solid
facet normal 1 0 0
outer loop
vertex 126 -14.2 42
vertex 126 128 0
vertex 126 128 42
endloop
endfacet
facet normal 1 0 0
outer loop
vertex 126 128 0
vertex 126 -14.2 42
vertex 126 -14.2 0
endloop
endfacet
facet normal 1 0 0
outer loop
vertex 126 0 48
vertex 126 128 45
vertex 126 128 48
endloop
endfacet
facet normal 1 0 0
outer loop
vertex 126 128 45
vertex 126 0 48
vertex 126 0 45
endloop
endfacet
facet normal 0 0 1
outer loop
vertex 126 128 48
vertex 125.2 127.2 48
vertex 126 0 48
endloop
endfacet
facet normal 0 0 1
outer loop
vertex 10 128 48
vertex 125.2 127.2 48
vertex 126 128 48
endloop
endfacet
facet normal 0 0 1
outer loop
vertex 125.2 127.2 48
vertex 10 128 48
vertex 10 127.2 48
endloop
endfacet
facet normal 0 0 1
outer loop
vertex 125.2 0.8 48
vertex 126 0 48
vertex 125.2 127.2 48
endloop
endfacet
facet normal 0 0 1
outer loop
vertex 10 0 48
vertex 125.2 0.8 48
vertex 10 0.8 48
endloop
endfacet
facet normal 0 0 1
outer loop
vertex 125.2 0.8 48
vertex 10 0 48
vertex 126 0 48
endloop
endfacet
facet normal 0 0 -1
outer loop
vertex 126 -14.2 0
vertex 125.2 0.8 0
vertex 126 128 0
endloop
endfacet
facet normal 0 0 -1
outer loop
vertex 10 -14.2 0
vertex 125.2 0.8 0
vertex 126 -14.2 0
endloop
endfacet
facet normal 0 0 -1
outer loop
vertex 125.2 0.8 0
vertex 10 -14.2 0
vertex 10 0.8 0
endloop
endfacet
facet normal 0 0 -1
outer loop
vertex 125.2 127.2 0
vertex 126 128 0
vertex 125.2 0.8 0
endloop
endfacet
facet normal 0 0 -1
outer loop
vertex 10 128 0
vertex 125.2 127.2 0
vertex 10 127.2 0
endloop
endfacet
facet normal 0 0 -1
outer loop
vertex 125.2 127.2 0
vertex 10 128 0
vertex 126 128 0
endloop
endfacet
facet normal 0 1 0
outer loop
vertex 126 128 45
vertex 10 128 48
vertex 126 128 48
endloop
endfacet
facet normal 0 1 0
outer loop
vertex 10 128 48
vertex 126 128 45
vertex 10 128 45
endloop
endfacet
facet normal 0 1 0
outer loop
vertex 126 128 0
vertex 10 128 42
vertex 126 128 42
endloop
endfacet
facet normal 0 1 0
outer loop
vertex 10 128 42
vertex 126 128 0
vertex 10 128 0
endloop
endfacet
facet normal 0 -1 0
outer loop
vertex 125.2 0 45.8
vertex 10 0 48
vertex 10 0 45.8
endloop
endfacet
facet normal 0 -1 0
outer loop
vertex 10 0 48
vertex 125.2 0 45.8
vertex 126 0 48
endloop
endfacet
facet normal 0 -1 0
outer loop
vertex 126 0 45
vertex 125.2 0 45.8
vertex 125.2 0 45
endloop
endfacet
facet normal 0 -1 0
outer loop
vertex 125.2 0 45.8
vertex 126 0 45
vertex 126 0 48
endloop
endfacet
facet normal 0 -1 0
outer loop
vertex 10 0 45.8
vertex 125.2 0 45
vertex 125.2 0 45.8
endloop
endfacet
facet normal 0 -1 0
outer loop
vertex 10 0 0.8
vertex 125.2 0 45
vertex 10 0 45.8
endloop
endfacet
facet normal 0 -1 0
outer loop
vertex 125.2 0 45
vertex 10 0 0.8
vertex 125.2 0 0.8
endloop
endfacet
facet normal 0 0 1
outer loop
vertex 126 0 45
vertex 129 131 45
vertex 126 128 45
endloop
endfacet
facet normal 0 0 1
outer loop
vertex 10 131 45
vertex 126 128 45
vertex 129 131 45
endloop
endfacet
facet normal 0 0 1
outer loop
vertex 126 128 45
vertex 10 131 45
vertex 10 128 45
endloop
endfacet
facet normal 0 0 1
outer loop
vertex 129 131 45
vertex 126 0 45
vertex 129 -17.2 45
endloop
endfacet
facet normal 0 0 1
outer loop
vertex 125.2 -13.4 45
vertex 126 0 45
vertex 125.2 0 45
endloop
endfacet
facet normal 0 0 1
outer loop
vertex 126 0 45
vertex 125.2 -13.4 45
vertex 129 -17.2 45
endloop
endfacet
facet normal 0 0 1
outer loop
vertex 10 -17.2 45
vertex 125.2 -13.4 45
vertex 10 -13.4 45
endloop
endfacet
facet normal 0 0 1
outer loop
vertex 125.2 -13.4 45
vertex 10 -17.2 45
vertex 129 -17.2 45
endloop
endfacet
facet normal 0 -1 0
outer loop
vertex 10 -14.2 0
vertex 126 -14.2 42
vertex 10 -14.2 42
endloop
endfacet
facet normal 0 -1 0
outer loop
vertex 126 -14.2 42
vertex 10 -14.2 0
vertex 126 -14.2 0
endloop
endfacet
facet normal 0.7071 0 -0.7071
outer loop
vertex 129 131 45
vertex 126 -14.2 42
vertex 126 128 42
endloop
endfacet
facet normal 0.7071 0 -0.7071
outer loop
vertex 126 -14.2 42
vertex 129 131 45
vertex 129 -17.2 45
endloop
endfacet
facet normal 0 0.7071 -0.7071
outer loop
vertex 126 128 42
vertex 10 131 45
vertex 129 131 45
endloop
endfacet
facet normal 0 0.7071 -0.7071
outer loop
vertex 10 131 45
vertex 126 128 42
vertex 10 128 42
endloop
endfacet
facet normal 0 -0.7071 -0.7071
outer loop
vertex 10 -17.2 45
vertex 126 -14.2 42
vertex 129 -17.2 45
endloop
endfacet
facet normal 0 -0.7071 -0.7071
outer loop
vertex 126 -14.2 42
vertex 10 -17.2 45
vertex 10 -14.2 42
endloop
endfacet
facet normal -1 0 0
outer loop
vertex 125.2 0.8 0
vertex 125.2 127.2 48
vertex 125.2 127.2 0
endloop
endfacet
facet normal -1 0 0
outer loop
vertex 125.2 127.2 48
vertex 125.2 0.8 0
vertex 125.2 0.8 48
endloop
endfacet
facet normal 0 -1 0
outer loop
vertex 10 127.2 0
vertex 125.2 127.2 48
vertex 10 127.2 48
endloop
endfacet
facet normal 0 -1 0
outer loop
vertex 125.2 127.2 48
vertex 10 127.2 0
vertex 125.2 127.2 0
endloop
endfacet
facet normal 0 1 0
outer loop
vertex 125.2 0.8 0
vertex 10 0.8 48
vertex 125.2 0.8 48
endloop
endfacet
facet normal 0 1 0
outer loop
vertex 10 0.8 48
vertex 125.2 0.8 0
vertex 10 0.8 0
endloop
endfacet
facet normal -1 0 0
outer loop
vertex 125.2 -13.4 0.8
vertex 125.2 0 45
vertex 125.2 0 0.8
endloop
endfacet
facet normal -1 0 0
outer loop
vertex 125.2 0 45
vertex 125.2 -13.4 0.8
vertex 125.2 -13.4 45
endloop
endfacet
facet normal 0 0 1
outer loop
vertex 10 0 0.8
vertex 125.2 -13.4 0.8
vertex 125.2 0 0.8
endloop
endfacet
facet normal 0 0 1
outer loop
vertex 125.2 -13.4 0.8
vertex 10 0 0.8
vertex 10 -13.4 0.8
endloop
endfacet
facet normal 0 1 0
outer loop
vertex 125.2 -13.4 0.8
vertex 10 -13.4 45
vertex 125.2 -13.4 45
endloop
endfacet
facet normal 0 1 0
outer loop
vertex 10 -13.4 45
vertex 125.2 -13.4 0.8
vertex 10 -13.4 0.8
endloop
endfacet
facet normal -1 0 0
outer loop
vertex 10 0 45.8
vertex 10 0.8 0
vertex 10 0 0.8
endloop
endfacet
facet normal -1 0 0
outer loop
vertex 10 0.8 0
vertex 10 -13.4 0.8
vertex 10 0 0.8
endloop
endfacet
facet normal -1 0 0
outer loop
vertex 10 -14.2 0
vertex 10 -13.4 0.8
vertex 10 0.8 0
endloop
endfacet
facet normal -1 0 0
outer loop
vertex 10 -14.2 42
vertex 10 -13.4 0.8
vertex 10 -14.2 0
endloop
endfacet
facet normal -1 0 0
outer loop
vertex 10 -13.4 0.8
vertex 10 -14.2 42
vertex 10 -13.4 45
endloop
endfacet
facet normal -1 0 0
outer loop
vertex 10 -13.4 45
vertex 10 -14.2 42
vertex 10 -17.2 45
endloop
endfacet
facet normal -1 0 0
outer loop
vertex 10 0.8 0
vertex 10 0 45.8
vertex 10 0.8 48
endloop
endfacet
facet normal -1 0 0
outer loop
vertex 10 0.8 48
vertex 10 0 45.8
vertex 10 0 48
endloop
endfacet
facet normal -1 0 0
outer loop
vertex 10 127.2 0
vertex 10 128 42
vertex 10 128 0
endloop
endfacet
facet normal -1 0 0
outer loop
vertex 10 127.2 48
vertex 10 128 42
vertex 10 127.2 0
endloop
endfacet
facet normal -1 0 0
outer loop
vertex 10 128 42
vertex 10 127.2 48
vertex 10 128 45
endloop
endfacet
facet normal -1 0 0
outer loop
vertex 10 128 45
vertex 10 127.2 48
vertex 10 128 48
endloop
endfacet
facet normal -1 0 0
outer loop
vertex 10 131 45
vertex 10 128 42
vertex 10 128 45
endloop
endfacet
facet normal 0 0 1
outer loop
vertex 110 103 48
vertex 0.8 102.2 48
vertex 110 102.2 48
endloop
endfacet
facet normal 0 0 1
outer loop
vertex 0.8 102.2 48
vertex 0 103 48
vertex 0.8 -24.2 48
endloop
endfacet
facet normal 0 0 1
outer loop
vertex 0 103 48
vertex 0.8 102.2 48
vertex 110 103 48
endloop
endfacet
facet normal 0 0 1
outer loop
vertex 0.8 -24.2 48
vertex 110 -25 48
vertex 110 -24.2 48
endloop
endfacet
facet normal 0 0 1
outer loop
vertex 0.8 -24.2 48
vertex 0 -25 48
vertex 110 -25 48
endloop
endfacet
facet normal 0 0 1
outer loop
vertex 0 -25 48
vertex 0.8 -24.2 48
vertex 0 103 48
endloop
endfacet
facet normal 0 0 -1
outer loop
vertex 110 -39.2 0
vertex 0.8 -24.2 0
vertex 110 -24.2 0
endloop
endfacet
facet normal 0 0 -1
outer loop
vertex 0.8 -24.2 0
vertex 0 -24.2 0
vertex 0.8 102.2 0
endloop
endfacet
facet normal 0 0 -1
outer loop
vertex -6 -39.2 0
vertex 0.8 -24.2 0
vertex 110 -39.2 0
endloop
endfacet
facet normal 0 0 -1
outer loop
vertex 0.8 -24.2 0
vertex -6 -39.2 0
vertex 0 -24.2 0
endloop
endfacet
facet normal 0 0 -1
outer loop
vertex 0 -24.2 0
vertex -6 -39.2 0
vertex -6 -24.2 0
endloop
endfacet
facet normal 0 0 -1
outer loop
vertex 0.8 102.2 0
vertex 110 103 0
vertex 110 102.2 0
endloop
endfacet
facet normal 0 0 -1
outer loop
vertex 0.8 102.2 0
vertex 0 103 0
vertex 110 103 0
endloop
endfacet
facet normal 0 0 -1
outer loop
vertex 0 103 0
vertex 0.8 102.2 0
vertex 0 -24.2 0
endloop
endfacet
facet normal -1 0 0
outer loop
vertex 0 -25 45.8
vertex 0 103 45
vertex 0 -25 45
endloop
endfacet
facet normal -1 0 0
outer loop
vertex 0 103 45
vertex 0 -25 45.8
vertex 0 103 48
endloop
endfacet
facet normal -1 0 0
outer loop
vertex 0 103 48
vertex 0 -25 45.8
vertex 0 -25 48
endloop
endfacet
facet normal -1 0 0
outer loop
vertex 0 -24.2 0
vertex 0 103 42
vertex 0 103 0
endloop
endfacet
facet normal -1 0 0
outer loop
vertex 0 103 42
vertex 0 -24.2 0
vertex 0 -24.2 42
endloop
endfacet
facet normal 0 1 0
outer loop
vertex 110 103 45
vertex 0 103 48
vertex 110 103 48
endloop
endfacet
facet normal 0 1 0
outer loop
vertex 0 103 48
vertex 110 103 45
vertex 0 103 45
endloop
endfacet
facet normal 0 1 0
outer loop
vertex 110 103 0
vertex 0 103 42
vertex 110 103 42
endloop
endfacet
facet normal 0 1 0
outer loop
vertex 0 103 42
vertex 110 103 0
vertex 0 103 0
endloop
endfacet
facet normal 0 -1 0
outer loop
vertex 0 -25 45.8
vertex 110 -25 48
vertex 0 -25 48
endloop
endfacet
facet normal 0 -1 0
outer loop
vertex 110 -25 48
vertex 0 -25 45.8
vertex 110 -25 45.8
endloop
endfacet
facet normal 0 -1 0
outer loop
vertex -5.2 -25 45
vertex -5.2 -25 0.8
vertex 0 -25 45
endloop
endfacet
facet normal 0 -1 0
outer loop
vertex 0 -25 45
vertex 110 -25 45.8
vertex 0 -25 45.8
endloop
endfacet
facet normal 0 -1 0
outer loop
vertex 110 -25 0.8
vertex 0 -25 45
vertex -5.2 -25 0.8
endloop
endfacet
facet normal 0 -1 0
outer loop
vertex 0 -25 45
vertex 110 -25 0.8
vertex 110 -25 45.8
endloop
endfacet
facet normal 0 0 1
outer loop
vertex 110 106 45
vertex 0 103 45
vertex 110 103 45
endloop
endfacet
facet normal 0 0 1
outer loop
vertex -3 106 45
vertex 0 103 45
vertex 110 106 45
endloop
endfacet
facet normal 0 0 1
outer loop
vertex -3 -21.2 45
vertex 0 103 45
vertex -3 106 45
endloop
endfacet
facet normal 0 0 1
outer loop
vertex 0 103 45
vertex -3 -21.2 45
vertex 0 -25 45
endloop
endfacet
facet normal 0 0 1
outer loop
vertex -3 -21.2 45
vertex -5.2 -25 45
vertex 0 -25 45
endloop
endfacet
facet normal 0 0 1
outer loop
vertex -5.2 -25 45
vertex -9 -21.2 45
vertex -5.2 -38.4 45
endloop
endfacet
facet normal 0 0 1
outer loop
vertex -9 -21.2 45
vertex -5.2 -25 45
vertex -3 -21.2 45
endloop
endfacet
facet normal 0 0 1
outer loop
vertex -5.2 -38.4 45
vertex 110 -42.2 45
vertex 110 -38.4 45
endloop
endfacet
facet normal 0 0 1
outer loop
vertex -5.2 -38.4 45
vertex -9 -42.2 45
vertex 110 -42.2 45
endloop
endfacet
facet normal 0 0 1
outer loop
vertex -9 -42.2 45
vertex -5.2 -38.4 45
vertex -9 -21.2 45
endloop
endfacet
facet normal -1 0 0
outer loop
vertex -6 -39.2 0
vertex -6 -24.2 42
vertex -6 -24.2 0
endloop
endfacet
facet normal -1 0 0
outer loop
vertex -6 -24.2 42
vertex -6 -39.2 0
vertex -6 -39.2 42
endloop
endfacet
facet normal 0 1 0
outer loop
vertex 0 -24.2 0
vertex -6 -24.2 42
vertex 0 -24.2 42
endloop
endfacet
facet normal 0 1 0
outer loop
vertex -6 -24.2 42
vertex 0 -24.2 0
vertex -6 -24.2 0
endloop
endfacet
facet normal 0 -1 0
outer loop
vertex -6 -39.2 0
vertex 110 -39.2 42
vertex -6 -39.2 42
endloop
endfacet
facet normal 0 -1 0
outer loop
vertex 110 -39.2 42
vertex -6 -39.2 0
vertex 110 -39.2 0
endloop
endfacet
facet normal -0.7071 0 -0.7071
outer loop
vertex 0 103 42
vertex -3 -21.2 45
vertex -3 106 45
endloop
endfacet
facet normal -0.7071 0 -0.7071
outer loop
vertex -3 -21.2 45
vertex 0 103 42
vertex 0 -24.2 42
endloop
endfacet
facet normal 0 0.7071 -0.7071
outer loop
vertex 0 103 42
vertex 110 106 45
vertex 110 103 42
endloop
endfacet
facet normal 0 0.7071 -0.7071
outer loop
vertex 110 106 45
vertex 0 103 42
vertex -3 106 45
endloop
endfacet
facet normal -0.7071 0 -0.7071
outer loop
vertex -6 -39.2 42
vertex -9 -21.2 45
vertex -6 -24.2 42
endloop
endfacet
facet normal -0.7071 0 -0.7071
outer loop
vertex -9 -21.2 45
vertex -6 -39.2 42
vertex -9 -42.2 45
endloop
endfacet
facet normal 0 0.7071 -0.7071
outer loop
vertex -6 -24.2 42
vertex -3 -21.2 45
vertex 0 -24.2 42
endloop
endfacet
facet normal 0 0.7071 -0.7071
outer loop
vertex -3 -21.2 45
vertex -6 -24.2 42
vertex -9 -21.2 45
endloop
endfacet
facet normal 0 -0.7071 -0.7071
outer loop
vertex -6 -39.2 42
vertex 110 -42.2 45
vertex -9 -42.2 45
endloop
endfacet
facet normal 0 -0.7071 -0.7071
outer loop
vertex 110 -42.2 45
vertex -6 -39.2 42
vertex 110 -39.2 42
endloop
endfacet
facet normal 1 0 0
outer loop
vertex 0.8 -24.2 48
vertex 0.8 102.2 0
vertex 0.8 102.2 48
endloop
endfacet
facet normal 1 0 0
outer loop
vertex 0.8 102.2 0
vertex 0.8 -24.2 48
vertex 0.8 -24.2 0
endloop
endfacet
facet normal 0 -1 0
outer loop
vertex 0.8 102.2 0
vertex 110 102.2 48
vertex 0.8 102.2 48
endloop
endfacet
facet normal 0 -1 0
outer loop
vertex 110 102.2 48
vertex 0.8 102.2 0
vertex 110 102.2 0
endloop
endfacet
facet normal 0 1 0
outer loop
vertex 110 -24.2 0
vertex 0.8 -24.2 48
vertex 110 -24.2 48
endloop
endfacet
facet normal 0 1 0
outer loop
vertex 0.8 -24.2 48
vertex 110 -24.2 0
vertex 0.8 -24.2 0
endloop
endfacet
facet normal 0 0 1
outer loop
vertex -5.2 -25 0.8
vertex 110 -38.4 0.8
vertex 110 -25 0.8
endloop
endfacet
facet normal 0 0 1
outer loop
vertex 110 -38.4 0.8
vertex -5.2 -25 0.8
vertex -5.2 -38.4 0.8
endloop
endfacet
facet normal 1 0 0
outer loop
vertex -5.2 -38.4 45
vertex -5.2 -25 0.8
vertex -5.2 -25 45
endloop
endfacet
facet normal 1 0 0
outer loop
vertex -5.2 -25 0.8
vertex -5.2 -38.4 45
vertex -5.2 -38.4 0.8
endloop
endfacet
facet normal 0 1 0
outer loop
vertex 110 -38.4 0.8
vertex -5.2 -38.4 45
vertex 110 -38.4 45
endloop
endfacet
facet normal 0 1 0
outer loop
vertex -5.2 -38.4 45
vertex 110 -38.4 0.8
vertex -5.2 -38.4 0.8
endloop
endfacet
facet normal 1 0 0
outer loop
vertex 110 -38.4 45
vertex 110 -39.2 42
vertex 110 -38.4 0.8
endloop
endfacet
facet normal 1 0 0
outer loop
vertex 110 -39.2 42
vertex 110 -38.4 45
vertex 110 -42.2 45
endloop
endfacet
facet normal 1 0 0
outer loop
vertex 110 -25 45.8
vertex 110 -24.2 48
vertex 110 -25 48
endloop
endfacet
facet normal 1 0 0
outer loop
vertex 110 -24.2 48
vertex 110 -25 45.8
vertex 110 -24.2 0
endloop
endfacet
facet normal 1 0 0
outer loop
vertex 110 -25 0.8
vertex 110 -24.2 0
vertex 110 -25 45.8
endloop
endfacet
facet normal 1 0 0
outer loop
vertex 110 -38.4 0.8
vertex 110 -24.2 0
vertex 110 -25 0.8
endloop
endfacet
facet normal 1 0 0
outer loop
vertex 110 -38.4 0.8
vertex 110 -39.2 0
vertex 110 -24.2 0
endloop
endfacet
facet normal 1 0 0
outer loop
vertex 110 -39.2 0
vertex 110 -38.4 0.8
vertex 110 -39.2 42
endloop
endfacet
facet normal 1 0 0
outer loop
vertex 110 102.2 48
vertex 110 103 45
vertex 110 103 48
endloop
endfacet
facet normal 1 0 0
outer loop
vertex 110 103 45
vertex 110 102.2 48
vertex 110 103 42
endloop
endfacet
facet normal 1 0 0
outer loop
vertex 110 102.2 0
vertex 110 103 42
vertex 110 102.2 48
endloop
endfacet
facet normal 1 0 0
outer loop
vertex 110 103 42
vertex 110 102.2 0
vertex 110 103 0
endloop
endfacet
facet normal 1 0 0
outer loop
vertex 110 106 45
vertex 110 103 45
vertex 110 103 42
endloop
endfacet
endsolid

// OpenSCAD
//include <../import/BOSL2/std.scad>
/*floor=0.4;
led_depth=1.2;
led_length=195;
led_width=10.5;
led_dist=12;
box_size=[195,145];
translate(-box_size/2) cube([box_size[0],box_size[1],floor]);
translate([0,-box_size[1]/2,floor]) rotate([90,0,90])linear_extrude(height=led_length,center=true)
  difference() {
    square([box_size[1],led_depth]);
    for (shift=[led_dist/2:led_dist:box_size[1]-1]) translate([shift,0]) polygon([[-led_width/2,0],[led_width/2,0],[0,led_width/2]]);
  }
*/
height=45;
width=226;
depth=128;
lip=3;
wall=0.8;
el_depth=15;
el_width=6;
bsl=1/100;
/*
*intersection() {
  translate([-100,0,0])cube([200,200,200],center=true);
  union() {
    linear_extrude(height=height+lip,convexity=6) {
      difference() {
        square([width,depth],center=true);
        square([width-2*wall,depth-2*wall],center=true);
      }
    }
    translate([0,-el_depth/2-depth/2+wall,0])linear_extrude(height=height,convexity=6) {
      difference() {
        square([width+6*lip,el_depth],center=true);
        square([width+6*lip-2*wall,el_depth-2*wall],center=true);
      }
    }
    translate([0,0,height-lip])difference(){
      linear_extrude(height=lip, scale=[(width+2*lip)/width,(depth+2*lip)/depth]) square([width,depth],center=true);
      cube([width,depth,3*lip],center=true);
      translate([0,-depth/2,0])cube([width+2*lip,7*lip,3*lip],center=true);
    }
  }
}

*/

module thingy() difference() {
  union() {
    cube([width,depth,height+lip]); //bigger cube
    translate([-el_width,-el_depth+wall,0]) cube([width+el_width,el_depth,height]); //electronic cube
    translate([width/2,depth/2,height-lip]) linear_extrude(height=lip, scale=[(width+2*lip)/width,(depth+2*lip)/depth]) { //cugger lip
      square([width,depth],center=true);
    }
    translate([(width-el_width)/2,-el_depth/2+wall,height-lip]) linear_extrude(height=lip, scale=[(width+el_width+2*lip)/(width+el_width),(el_depth+2*lip)/(el_depth)]) { //lip around electronics
      square([width+el_width,el_depth],center=true);
    }
  }
  translate([wall,wall,-bsl]) cube([width-2*wall,depth-2*wall,height+lip+2*bsl]); //big hole
  translate([-el_width+wall,-el_depth+2*wall,wall]) cube([width+el_width-2*wall,el_depth-2*wall,height]); //electronic hole
}

//render() 
{ //divide into two parts, bring to one build plate
  translate([-100,0,0]) intersection() {
    translate([110,-50,-10]) cube([200,200,200]);
    thingy();
  }
  translate([0,-25,0]) difference() {
    thingy();
    translate([110,-50,-10]) cube([200,200,200]);
  }
}
